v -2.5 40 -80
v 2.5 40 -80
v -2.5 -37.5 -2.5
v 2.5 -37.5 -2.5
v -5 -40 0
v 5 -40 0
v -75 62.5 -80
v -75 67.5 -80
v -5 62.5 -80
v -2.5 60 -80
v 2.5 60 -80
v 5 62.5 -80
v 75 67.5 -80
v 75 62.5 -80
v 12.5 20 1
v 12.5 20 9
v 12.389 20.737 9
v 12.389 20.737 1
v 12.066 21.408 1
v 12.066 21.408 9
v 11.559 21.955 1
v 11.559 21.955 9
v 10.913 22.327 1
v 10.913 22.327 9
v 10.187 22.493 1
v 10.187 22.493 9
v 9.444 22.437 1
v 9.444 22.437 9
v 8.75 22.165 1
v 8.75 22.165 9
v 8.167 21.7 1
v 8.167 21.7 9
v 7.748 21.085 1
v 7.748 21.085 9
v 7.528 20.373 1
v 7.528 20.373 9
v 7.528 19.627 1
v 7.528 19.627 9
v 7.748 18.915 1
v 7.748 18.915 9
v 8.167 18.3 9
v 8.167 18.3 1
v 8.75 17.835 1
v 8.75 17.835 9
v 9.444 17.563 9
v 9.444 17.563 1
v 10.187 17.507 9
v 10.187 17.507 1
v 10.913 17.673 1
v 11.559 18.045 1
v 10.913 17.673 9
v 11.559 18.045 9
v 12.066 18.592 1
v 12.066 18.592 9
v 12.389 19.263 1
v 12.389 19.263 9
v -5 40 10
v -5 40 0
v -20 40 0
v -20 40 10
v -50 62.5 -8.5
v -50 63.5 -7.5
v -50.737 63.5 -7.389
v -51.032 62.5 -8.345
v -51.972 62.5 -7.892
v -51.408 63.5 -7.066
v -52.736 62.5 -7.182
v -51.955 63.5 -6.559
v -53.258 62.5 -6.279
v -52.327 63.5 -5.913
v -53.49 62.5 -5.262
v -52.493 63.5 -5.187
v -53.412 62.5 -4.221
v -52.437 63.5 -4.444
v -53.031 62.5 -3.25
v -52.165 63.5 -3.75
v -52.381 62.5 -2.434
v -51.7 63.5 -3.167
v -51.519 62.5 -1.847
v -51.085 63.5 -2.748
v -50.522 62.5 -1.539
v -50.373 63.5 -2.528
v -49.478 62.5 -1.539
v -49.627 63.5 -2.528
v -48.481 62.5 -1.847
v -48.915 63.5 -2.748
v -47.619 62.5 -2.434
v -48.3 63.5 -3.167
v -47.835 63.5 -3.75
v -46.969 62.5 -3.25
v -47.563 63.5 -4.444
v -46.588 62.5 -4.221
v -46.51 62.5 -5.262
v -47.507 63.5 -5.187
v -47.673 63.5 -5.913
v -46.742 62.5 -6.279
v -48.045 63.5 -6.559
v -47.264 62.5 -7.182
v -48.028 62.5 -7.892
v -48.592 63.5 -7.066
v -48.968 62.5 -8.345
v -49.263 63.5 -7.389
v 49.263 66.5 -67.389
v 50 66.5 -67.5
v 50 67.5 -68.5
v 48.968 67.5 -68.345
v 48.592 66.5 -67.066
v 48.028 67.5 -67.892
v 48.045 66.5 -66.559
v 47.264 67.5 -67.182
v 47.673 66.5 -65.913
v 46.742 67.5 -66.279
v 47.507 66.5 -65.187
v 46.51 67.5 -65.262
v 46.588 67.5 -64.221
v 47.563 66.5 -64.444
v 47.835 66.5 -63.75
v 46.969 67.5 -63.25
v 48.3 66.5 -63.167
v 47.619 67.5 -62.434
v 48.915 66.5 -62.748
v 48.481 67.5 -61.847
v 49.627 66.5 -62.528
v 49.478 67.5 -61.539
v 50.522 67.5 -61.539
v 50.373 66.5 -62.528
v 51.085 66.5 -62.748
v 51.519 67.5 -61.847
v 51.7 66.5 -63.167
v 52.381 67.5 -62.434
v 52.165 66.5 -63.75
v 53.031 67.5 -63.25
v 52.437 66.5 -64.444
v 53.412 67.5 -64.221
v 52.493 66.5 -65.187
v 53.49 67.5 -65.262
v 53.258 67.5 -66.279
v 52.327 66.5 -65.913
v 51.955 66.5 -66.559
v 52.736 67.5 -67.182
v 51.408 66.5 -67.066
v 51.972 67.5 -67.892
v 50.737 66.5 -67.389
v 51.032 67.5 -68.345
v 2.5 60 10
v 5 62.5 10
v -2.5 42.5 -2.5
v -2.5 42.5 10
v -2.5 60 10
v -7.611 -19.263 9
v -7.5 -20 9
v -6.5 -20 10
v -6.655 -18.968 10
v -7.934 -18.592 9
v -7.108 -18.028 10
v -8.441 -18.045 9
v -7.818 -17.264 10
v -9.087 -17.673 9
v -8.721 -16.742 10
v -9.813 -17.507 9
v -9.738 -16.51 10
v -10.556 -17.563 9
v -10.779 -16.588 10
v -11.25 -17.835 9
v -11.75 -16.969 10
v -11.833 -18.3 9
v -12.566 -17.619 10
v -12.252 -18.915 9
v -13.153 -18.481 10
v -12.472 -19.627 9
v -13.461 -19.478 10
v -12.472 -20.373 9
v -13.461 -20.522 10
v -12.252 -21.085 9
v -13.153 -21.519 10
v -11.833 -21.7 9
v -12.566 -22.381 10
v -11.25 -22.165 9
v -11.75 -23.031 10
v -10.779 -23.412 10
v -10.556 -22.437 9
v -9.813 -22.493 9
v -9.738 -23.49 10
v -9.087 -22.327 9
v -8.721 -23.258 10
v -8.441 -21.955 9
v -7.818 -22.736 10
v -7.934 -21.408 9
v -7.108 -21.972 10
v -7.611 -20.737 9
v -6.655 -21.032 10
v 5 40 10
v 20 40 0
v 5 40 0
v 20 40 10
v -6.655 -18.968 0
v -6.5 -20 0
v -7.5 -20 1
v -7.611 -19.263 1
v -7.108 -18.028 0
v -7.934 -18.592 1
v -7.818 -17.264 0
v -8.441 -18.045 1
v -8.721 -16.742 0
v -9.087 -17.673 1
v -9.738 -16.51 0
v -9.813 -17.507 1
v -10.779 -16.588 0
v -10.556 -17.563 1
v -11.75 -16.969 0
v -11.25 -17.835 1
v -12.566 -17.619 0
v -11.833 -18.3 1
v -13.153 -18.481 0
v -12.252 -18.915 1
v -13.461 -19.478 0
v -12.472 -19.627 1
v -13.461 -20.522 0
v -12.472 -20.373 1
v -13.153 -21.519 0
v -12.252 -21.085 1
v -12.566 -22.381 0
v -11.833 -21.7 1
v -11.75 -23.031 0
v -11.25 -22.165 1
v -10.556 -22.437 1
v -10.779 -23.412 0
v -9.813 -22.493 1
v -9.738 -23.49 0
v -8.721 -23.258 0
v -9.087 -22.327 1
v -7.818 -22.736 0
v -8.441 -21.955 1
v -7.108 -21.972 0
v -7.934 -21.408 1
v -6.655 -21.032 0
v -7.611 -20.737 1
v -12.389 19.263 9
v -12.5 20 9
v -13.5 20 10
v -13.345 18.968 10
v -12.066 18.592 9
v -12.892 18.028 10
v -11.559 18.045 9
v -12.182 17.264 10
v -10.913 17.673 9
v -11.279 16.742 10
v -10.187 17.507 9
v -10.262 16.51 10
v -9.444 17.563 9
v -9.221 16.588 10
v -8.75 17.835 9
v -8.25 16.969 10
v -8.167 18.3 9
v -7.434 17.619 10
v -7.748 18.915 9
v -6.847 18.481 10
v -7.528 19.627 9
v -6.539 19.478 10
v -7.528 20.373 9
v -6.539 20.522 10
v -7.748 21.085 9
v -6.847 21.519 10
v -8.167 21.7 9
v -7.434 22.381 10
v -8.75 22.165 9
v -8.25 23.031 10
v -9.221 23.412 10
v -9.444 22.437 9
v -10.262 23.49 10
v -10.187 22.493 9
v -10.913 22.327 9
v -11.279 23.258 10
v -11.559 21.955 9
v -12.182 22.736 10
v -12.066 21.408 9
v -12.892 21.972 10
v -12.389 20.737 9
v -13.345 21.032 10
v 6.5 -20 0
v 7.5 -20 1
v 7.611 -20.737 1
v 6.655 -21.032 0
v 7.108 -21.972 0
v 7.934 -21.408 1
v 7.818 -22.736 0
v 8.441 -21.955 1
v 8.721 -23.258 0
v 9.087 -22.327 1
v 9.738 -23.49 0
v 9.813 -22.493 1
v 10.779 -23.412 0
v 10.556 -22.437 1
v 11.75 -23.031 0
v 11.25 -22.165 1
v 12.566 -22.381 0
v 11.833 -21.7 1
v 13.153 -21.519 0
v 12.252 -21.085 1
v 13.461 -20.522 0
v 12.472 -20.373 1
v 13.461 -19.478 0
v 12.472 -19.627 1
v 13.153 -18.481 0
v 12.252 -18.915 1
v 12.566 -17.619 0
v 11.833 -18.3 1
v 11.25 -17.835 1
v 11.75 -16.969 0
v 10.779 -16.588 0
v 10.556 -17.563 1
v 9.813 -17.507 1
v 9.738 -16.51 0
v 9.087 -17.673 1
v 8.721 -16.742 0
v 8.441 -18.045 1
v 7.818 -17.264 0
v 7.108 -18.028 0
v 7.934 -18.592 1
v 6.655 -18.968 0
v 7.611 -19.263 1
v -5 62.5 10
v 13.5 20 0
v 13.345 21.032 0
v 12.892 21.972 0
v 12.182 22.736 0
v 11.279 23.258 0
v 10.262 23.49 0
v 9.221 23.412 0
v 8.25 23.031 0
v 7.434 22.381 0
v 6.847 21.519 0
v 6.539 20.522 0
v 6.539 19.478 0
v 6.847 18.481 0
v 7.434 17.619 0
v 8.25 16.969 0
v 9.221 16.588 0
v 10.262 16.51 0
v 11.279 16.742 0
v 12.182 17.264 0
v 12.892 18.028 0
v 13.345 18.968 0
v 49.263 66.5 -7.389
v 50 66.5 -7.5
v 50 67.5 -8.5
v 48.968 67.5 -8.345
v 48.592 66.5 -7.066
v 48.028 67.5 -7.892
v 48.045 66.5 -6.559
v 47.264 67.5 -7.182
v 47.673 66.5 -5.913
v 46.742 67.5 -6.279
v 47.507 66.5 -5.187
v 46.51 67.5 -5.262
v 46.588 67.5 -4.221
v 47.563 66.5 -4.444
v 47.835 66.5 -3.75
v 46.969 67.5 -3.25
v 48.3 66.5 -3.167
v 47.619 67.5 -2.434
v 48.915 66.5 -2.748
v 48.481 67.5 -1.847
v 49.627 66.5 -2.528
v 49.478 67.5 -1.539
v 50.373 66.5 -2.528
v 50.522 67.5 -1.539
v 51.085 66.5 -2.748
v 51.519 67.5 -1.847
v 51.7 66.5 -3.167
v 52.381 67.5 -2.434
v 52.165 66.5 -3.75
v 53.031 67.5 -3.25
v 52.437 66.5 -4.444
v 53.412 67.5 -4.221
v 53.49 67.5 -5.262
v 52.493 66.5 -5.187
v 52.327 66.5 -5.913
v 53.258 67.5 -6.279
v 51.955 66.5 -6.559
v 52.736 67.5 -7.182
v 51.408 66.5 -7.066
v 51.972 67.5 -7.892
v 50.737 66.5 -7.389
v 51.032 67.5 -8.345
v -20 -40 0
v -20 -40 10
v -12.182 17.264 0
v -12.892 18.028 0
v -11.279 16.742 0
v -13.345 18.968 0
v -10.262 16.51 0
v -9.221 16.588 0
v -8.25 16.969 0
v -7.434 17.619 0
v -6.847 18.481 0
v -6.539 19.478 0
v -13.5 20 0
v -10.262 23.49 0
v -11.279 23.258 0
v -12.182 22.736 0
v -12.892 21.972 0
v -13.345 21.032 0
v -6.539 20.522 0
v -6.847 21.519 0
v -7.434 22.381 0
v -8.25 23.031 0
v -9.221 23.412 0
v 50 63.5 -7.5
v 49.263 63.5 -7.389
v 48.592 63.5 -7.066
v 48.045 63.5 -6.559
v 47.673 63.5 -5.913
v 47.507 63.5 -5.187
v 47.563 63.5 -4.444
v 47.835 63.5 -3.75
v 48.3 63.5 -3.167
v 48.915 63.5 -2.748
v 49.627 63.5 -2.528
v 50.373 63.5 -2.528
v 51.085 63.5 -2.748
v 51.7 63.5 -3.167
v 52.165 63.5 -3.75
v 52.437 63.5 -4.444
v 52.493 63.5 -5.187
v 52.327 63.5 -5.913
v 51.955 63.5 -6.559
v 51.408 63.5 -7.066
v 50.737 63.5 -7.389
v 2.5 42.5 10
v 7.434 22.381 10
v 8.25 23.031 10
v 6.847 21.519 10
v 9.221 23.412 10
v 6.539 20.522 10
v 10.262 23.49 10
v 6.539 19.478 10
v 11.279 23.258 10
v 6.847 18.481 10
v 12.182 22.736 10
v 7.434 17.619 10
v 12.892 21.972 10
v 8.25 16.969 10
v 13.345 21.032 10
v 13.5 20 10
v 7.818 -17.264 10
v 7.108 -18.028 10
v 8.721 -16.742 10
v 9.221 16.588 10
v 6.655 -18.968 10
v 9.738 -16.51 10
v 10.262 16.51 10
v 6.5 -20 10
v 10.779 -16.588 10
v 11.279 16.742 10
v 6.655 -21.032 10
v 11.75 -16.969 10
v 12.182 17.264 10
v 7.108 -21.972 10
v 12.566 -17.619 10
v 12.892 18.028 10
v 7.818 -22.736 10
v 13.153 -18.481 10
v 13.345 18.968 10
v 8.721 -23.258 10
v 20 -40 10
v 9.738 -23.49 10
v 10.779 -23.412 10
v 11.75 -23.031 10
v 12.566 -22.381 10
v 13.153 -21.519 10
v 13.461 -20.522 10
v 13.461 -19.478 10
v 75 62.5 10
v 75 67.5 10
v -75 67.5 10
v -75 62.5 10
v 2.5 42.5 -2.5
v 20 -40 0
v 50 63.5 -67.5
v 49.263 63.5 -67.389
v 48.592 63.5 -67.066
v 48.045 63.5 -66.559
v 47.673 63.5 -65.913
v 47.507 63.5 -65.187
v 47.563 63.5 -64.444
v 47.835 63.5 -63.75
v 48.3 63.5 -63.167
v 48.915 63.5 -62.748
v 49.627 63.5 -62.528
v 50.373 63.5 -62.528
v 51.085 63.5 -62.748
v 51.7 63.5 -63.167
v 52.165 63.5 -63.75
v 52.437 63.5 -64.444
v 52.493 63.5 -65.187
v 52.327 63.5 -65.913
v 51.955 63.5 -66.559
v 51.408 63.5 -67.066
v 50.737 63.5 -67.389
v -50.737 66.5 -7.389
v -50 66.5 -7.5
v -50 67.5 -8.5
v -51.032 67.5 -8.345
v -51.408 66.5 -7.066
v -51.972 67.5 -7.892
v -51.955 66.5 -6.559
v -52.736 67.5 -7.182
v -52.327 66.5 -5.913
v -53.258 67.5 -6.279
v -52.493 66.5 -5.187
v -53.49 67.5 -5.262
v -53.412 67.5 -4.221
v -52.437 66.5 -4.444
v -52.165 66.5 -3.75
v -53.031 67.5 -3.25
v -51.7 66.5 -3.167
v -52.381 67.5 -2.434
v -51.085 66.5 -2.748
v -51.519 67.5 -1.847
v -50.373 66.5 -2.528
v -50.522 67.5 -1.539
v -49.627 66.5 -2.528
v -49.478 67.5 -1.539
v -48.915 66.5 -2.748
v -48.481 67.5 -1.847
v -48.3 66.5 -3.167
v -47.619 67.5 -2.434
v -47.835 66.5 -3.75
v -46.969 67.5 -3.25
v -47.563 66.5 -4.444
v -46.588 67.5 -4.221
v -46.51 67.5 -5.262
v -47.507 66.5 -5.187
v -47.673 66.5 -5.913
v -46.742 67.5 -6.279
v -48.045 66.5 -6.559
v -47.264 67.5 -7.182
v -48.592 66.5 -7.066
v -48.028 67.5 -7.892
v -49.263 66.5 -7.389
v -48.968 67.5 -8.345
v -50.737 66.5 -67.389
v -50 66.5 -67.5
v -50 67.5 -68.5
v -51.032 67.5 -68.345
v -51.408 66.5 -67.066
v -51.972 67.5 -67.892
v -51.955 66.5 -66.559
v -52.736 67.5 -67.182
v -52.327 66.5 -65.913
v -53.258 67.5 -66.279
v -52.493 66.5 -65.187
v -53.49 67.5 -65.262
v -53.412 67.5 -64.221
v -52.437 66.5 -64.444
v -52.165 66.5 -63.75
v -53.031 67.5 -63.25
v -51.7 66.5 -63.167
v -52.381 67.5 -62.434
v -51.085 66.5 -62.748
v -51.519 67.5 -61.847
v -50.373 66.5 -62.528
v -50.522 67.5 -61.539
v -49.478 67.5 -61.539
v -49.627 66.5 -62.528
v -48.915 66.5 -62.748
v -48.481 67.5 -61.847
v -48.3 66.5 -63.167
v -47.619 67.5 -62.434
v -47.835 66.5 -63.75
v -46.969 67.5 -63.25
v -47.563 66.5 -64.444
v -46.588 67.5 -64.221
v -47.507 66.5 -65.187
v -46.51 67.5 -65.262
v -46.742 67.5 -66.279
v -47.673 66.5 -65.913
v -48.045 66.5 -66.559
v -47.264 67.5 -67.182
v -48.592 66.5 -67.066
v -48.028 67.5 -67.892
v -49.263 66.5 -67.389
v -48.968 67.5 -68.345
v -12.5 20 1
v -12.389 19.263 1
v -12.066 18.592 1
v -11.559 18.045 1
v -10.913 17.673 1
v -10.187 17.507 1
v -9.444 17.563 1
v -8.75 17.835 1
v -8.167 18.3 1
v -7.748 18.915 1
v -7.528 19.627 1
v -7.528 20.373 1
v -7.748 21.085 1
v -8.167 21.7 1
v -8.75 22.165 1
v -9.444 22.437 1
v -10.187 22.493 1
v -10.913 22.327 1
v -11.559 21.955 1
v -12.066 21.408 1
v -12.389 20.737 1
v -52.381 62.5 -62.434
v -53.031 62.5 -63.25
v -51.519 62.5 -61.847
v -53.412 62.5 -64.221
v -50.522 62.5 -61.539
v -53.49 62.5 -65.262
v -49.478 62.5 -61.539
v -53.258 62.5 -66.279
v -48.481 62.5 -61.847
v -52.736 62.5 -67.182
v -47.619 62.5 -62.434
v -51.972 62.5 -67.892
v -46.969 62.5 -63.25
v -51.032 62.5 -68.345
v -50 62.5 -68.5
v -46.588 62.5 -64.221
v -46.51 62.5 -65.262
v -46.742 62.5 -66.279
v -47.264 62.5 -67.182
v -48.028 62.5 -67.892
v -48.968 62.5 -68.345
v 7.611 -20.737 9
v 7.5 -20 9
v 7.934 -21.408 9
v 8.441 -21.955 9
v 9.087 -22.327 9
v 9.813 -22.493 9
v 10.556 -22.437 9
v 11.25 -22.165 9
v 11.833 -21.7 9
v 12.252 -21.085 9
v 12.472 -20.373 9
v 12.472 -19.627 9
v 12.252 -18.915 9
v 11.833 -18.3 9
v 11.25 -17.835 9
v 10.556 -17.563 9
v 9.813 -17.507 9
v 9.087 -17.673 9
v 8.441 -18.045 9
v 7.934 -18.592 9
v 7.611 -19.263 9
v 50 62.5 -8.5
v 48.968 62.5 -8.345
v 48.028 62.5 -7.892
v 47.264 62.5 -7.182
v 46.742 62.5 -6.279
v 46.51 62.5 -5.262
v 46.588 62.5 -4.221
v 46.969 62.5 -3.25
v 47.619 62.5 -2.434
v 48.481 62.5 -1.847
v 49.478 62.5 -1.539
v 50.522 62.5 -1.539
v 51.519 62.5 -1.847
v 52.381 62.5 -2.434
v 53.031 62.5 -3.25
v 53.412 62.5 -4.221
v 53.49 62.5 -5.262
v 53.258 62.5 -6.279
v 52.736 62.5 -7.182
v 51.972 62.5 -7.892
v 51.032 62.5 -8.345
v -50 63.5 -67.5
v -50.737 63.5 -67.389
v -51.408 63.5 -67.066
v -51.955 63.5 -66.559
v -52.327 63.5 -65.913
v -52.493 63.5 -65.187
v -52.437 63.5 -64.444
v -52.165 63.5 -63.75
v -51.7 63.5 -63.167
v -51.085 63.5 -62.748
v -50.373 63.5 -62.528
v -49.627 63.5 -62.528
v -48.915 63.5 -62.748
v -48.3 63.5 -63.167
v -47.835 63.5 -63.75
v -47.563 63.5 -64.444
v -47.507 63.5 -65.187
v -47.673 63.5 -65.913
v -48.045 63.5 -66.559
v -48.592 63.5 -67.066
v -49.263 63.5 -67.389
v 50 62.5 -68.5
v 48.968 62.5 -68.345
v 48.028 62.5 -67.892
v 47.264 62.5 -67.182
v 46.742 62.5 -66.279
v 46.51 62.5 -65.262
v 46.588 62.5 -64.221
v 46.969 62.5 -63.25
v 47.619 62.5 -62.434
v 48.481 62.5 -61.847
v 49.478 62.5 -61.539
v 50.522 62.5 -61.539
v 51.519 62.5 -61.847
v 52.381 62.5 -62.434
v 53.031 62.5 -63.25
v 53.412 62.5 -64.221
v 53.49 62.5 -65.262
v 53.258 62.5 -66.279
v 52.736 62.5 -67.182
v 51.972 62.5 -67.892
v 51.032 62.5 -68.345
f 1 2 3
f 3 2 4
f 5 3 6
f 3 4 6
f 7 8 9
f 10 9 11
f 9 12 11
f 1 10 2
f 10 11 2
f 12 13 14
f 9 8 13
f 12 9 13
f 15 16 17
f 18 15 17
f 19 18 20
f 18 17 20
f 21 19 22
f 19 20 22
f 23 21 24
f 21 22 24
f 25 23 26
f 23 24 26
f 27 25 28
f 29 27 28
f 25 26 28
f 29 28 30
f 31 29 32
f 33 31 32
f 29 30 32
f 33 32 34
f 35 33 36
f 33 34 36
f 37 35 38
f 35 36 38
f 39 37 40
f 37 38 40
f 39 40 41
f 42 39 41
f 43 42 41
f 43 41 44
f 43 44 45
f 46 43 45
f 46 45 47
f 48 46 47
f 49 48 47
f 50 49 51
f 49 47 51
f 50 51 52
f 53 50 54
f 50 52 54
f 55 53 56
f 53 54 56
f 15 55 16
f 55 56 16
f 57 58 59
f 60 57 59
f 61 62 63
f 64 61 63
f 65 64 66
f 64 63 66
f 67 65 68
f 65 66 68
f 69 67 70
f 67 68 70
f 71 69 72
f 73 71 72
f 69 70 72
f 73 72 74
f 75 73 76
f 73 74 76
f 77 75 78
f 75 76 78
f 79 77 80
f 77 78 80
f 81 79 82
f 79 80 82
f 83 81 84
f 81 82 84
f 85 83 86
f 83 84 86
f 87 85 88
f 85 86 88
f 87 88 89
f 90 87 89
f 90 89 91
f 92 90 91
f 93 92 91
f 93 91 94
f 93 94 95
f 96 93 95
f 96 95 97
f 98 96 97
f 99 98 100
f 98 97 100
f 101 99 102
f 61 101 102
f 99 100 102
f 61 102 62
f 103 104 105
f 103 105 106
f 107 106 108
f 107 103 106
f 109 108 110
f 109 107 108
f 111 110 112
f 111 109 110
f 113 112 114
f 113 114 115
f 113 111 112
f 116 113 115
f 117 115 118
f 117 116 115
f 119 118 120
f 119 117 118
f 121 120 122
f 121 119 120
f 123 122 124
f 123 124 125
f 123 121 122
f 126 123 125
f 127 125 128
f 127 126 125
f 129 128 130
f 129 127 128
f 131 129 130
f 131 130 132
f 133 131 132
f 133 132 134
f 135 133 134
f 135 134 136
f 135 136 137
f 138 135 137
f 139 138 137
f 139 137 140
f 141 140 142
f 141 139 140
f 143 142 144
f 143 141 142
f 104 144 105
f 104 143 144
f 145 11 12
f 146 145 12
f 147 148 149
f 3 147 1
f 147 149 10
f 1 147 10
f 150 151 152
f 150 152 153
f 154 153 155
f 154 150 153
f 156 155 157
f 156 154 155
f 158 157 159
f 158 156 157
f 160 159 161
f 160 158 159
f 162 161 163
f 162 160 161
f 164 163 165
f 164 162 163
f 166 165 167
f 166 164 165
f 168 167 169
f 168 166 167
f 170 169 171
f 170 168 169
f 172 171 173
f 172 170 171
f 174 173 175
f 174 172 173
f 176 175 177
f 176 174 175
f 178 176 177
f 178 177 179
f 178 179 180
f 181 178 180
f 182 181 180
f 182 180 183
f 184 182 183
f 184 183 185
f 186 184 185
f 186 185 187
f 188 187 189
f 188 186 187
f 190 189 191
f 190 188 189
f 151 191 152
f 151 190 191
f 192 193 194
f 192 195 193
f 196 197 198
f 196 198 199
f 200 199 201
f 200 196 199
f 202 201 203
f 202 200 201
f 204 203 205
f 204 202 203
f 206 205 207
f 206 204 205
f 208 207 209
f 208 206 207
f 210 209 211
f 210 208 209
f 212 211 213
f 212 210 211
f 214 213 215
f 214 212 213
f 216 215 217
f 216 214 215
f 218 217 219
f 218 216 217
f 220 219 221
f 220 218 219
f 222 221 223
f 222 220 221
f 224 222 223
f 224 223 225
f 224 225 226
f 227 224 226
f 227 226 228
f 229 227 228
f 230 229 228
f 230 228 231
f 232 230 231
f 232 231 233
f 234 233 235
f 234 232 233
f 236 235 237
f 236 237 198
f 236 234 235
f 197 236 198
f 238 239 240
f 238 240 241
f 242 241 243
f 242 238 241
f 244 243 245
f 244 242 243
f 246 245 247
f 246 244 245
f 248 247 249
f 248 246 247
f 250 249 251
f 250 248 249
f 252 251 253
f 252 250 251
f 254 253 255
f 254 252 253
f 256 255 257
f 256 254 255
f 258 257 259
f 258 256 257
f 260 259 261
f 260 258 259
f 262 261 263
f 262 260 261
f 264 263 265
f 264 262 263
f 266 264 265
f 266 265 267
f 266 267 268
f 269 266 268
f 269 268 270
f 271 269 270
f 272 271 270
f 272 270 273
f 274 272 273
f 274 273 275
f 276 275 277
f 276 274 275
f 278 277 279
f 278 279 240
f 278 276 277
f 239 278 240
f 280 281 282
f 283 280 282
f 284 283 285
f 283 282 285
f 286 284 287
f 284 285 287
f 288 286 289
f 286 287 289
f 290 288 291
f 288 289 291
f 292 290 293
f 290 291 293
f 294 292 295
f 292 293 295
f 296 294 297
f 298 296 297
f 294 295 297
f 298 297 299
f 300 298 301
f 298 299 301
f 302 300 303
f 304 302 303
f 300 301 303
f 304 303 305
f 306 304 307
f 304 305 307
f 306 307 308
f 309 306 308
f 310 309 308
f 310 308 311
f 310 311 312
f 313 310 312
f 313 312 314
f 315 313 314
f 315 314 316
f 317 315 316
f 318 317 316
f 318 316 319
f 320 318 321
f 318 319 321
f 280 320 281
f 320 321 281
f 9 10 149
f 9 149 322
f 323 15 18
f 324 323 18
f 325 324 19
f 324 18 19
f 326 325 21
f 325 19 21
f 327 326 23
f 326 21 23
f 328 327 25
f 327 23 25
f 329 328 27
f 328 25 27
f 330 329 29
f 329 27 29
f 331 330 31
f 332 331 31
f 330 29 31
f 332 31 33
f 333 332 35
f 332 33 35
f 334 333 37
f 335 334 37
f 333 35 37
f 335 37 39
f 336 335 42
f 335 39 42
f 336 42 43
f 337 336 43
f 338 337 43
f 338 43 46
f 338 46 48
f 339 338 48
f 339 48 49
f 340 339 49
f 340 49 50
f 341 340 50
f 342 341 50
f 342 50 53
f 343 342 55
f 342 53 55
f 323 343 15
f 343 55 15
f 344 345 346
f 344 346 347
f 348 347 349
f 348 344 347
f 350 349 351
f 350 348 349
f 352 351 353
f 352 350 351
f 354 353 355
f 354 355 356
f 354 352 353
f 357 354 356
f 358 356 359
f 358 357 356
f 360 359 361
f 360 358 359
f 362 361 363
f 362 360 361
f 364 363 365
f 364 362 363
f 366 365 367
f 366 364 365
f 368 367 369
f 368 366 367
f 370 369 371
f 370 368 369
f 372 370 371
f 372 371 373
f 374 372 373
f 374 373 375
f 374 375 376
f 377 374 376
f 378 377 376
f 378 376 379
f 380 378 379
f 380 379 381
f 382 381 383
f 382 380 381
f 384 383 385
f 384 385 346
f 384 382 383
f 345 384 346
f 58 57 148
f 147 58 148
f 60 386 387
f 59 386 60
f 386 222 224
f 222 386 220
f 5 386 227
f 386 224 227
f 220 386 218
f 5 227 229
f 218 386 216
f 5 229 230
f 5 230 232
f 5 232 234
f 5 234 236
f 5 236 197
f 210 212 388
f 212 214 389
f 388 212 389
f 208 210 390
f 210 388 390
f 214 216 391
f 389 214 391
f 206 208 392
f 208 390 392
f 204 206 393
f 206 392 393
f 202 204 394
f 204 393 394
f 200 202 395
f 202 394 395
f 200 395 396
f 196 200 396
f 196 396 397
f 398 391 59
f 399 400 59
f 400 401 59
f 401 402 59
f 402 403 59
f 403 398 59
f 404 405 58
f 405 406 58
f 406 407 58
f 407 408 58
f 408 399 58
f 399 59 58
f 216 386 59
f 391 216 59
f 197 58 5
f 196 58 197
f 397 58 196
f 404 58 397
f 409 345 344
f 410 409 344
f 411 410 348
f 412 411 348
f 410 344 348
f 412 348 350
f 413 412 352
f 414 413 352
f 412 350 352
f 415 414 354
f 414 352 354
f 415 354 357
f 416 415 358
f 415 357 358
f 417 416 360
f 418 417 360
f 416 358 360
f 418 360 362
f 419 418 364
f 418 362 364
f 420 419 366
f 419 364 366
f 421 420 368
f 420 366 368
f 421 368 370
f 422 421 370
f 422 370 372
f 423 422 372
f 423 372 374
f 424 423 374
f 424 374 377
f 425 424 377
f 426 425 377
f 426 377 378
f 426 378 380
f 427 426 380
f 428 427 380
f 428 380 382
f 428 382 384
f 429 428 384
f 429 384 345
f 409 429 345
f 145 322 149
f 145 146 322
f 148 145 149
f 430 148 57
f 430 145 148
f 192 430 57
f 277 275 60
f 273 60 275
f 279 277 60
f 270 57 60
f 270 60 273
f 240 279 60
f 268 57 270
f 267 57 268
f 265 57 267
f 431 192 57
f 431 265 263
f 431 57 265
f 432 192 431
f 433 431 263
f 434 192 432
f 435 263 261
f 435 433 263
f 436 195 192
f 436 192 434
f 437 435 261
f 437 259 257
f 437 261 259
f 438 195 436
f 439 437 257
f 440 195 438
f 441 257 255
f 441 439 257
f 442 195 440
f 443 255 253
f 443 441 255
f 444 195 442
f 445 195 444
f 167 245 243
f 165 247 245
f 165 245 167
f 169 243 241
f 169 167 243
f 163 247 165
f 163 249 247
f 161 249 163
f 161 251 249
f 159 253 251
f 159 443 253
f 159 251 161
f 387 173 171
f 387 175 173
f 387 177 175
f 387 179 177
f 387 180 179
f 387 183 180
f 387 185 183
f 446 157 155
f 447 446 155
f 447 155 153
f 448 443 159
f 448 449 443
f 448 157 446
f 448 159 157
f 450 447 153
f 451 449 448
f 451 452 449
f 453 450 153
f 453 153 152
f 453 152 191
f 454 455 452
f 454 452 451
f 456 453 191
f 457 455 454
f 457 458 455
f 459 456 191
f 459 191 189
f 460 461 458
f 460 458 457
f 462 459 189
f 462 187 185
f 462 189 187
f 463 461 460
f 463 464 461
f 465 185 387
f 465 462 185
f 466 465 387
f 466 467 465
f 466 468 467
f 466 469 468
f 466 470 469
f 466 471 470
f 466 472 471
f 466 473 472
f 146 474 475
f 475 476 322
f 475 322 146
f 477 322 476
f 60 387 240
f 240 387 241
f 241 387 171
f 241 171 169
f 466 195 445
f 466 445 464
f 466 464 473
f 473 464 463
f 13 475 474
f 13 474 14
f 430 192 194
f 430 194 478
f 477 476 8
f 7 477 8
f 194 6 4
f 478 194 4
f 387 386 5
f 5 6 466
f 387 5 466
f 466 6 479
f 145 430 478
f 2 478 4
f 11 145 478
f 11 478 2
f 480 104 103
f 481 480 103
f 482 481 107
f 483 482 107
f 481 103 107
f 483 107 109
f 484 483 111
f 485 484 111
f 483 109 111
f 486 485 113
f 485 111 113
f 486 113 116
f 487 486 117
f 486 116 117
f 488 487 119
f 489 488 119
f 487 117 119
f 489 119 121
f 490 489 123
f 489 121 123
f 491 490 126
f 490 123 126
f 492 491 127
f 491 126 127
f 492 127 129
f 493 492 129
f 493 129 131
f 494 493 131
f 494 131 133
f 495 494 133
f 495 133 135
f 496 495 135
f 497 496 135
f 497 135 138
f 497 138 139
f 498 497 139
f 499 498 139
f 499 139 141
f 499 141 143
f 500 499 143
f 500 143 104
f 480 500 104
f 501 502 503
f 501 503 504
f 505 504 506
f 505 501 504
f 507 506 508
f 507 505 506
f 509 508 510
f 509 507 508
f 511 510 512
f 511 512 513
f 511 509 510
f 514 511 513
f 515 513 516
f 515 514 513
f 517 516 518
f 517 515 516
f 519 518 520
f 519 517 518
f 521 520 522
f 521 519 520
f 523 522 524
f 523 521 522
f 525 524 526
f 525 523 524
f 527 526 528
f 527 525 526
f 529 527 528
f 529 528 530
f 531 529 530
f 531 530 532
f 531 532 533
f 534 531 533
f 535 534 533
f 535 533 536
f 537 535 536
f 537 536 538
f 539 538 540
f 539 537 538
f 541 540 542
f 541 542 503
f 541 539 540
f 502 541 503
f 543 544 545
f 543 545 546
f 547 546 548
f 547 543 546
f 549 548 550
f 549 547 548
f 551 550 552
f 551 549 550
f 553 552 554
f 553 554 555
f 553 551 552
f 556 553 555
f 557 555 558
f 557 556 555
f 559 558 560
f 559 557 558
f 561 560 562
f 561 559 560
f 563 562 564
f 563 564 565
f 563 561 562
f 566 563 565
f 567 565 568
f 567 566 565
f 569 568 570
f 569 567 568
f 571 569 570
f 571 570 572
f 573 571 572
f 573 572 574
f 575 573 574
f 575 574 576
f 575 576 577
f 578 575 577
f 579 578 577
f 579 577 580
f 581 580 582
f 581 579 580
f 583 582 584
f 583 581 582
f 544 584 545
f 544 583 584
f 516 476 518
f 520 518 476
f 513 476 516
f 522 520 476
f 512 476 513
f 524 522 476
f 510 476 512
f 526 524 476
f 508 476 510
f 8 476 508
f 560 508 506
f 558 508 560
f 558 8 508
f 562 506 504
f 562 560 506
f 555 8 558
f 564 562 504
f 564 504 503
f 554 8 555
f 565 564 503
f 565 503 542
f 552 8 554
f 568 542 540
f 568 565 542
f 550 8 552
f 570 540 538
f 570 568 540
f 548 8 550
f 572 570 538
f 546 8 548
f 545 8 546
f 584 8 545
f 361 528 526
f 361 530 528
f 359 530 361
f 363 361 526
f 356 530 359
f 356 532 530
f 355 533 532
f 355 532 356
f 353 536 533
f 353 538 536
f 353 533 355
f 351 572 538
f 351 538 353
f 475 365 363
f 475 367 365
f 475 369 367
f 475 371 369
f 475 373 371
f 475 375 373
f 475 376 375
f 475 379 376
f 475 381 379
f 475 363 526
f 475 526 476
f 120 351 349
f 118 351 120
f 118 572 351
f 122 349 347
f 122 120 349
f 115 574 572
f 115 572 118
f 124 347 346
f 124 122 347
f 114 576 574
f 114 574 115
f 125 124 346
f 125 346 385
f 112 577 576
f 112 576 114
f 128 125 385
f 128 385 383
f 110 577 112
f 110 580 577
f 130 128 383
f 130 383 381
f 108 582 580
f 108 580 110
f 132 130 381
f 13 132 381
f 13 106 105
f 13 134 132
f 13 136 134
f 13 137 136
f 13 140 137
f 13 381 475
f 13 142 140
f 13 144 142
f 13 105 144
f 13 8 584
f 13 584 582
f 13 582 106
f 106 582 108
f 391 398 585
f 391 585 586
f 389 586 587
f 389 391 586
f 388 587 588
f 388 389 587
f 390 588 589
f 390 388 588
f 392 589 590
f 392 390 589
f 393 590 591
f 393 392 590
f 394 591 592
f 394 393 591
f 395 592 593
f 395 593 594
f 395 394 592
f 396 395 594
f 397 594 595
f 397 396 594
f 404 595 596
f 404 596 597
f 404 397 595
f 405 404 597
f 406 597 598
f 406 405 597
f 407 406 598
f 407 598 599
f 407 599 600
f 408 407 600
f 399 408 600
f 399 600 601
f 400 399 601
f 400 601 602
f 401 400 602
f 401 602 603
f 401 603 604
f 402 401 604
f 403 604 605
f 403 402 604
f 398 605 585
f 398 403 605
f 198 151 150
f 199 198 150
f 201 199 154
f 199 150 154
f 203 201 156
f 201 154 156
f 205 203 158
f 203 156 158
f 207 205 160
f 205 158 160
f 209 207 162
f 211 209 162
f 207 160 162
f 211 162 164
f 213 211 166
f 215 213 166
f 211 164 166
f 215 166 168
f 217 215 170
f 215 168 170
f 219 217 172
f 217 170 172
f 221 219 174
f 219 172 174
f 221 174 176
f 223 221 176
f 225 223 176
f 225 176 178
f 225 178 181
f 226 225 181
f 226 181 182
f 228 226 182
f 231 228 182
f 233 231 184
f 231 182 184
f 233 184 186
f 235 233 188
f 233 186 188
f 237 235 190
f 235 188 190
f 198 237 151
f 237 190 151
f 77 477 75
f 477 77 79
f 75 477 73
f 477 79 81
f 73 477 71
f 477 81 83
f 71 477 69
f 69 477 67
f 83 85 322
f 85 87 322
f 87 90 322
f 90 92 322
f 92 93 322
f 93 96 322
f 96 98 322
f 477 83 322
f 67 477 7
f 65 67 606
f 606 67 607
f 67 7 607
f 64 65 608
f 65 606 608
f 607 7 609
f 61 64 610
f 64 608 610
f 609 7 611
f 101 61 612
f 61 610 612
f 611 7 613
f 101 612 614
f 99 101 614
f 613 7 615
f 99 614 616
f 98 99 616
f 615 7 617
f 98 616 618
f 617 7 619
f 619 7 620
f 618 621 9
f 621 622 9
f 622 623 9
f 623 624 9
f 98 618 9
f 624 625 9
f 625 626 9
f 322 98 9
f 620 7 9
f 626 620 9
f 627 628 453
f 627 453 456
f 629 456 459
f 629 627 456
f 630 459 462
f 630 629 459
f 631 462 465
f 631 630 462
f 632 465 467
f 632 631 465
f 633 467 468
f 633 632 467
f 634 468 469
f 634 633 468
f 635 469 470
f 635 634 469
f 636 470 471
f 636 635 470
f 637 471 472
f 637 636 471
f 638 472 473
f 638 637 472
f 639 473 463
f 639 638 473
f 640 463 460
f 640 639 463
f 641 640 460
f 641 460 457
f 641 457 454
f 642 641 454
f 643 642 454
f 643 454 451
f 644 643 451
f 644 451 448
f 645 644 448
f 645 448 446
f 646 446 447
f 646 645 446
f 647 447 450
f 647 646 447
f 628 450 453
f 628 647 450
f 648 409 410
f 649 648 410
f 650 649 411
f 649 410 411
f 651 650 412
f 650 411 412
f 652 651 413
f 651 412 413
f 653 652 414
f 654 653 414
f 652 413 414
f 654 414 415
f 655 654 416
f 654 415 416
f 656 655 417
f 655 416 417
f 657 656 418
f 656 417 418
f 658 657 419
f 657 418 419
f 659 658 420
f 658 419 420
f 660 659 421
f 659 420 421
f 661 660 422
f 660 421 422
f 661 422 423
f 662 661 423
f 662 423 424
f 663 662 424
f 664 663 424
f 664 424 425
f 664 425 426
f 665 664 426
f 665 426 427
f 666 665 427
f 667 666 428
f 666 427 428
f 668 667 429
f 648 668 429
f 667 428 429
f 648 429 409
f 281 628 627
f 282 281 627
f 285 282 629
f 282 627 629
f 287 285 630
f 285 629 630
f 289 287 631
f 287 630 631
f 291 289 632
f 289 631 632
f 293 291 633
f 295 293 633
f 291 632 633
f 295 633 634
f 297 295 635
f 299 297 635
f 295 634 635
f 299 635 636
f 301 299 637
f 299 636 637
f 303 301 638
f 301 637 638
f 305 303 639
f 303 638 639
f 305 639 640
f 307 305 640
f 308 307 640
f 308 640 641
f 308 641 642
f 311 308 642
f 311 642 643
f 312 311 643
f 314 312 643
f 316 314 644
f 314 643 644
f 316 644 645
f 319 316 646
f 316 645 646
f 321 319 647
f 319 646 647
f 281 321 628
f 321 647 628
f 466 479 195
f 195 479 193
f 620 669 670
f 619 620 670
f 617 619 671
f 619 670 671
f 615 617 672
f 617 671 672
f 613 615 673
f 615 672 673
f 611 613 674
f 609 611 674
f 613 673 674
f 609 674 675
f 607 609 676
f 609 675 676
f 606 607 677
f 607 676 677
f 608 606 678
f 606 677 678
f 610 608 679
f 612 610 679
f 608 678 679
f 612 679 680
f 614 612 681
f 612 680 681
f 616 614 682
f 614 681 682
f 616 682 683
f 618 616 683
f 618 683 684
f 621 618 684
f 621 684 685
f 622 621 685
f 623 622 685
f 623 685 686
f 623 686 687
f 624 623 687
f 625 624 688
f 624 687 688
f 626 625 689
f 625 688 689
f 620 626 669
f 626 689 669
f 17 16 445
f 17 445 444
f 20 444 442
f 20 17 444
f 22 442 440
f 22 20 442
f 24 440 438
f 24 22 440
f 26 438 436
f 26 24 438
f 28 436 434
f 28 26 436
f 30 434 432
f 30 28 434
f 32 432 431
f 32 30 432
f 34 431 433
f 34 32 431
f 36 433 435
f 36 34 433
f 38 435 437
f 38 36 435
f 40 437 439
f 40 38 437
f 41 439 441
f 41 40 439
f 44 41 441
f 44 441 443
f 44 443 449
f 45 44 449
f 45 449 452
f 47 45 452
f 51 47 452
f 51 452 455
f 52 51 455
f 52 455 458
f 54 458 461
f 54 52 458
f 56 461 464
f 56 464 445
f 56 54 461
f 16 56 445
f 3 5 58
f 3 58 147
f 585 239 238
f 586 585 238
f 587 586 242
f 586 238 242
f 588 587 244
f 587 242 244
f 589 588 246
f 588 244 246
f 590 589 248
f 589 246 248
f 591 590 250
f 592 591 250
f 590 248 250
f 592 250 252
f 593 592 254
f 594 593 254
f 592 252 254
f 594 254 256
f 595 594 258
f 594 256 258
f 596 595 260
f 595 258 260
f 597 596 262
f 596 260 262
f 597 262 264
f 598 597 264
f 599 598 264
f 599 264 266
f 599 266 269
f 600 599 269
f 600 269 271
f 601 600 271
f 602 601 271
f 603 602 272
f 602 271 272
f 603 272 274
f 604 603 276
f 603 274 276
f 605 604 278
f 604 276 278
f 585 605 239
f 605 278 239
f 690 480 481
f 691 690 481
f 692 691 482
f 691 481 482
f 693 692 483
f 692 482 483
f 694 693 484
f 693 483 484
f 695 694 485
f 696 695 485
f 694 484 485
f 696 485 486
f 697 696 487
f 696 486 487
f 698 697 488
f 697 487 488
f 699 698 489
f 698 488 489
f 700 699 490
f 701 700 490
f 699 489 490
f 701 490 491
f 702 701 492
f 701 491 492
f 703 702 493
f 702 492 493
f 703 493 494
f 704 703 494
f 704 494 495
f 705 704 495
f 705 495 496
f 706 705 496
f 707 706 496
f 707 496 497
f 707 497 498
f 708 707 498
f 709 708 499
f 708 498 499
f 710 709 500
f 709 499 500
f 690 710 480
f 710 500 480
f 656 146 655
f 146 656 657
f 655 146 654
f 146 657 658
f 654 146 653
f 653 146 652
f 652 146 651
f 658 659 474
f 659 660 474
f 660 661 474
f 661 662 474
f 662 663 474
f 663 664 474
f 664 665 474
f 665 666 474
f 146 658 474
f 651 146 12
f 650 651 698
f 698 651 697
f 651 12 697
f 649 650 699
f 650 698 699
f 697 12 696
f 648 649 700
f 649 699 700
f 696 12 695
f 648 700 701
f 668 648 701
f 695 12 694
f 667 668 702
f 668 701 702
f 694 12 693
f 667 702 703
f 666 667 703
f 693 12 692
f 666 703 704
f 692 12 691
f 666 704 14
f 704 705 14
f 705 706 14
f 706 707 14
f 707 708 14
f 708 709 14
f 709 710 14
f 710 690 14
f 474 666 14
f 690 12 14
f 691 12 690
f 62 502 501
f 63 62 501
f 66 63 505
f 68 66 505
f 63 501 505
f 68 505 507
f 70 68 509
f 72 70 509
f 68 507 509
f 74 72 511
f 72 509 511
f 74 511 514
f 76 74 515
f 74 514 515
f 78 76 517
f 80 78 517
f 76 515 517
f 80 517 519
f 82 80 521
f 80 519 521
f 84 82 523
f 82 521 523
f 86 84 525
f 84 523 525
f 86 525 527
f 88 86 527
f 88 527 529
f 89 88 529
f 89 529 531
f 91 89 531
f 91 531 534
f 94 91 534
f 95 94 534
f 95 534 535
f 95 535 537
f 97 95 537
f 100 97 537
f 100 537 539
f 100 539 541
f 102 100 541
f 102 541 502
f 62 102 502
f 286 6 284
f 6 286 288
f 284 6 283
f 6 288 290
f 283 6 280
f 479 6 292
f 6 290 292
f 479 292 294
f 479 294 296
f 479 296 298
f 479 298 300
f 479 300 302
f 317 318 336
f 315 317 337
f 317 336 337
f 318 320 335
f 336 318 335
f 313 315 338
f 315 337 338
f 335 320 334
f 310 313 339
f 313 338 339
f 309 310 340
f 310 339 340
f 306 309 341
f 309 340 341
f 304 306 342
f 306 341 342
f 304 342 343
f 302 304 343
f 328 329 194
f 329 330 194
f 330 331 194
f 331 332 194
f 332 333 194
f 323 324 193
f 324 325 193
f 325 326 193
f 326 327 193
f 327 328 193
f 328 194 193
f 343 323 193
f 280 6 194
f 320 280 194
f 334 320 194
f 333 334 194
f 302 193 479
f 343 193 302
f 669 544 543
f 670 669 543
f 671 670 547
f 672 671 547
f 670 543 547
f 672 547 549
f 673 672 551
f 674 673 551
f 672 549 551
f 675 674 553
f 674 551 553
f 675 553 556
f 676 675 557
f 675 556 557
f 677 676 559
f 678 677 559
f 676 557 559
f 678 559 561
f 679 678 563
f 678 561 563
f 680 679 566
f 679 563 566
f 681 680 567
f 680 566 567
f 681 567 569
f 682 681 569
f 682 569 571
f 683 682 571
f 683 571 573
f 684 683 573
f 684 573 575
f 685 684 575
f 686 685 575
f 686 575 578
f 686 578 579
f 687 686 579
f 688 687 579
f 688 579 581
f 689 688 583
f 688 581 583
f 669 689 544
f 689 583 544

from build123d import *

# Parameters (mm, degrees)
SKETCH1_W           = 40
SKETCH1_H           = 80
BOSS_EXTRUDE1_DEPTH = 10
SKETCH2_R           = 2.5
CUT_EXTRUDE1_DEPTH  = 10
BOSS_EXTRUDE2_DEPTH = 2.5
SKETCH4_W           = 150
SKETCH4_H           = 90
BOSS_EXTRUDE3_DEPTH = 2.5
CHAMFER1_SIZE       = 2.5
SKETCH5_R           = 2.5
CUT_EXTRUDE2_DEPTH  = 35
CHAMFER2_SIZE       = 1


with BuildPart() as part:
    # Sketch1 → Boss-Extrude1 (new body)
    with BuildSketch(Plane.XY):
        Rectangle(SKETCH1_W, SKETCH1_H)
    extrude(amount=BOSS_EXTRUDE1_DEPTH)

    # Sketch2 → Cut-Extrude1 (cut)
    with BuildSketch(Plane.XY.offset(10)):
        with Locations((-10, -20)):
            Circle(SKETCH2_R)
        with Locations(Location((10, -20, 0), (0, 0, 180))):
            Circle(SKETCH2_R)
        with Locations((10, 20)):
            Circle(SKETCH2_R)
        with Locations(Location((-10, 20, 0), (0, 0, 180))):
            Circle(SKETCH2_R)
    extrude(amount=-CUT_EXTRUDE1_DEPTH, mode=Mode.SUBTRACT)

    # Sketch3 → Boss-Extrude2 (add, symmetric)
    with BuildSketch(Plane(origin=(0, 0, 0), x_dir=(0, 0, -1), z_dir=(1, 0, 0))):
        Polygon((0, -40), (80, 40), (80, 65), (-10, 65), (-10, 40), (0, 40), align=None)
    extrude(amount=BOSS_EXTRUDE2_DEPTH, both=True)

    # Sketch4 → Boss-Extrude3 (add, symmetric)
    with BuildSketch(Plane(origin=(0, 65, 0), x_dir=(1, 0, 0), z_dir=(0, 1, 0))):
        with Locations((0, 35)):
            Rectangle(SKETCH4_W, SKETCH4_H)
    extrude(amount=BOSS_EXTRUDE3_DEPTH, both=True)

    # Chamfer1
    # the kernel refuses this chamfer: 2.5 mm, written as the material it adds along each edge
    with BuildSketch(Plane(origin=(-2.5, 40, 0), x_dir=(-0.9996219169112968, 0, 0.027495876610586372), z_dir=(0, -1, 0))) as chamfer1_piece_1_section:
        Polygon((CHAMFER1_SIZE * 0.999621916911, CHAMFER1_SIZE * 0.0274958766106), (-CHAMFER1_SIZE * 0.0274958766106, CHAMFER1_SIZE * 0.999621916911), (0, 0), align=None)
    chamfer1_piece_1 = extrude(amount=80, mode=Mode.PRIVATE)
    chamfer1_piece_1 = split(chamfer1_piece_1, bisect_by=Plane(origin=(-3.327144793, -19.384975846, -20.615024154), z_dir=(0, 0.7071067811865487, 0.7071067811865464)), keep=Keep.TOP, mode=Mode.PRIVATE)
    add(chamfer1_piece_1)
    with BuildSketch(Plane(origin=(-2.5, 40, 10), x_dir=(-0.9996219169112968, -0.0274958766105877, 0), z_dir=(0, 0, -1))) as chamfer1_piece_2:
        Polygon((CHAMFER1_SIZE * 0.999621916911, CHAMFER1_SIZE * 0.0274958766106), (-CHAMFER1_SIZE * 0.0274958766106, CHAMFER1_SIZE * 0.999621916911), (0, 0), align=None)
    extrude(amount=10)
    with BuildSketch(Plane(origin=(2.5, 40, 0), x_dir=(0.9996219169112968, 0, 0.027495876610586372), z_dir=(0, -1, 0))) as chamfer1_piece_3_section:
        Polygon((CHAMFER1_SIZE * 0.999621916911, -CHAMFER1_SIZE * 0.0274958766106), (-CHAMFER1_SIZE * 0.0274958766106, -CHAMFER1_SIZE * 0.999621916911), (0, 0), align=None)
    chamfer1_piece_3 = extrude(amount=80, mode=Mode.PRIVATE)
    chamfer1_piece_3 = split(chamfer1_piece_3, bisect_by=Plane(origin=(3.327144793, -19.384975846, -20.615024154), z_dir=(0, 0.7071067811865487, 0.7071067811865464)), keep=Keep.TOP, mode=Mode.PRIVATE)
    add(chamfer1_piece_3)
    with BuildSketch(Plane(origin=(2.5, 40, 10), x_dir=(0.9996219169112968, -0.0274958766105877, 0), z_dir=(0, 0, -1))) as chamfer1_piece_4:
        Polygon((CHAMFER1_SIZE * 0.999621916911, -CHAMFER1_SIZE * 0.0274958766106), (-CHAMFER1_SIZE * 0.0274958766106, -CHAMFER1_SIZE * 0.999621916911), (0, 0), align=None)
    extrude(amount=10)
    with BuildSketch(Plane(origin=(-2.5, 62.5, -80), x_dir=(0.027495876610586282, -0.9996219169112968, 0), z_dir=(0, 0, 1))) as chamfer1_piece_5:
        Polygon((CHAMFER1_SIZE * 0.999621916911, -CHAMFER1_SIZE * 0.0274958766106), (-CHAMFER1_SIZE * 0.0274958766106, -CHAMFER1_SIZE * 0.999621916911), (0, 0), align=None)
    extrude(amount=90)
    with BuildSketch(Plane(origin=(2.5, 62.5, -80), x_dir=(-0.027495876610586282, -0.9996219169112968, 0), z_dir=(0, 0, 1))) as chamfer1_piece_6:
        Polygon((CHAMFER1_SIZE * 0.999621916911, CHAMFER1_SIZE * 0.0274958766106), (-CHAMFER1_SIZE * 0.0274958766106, CHAMFER1_SIZE * 0.999621916911), (0, 0), align=None)
    extrude(amount=90)
    with BuildSketch(Plane(origin=(-2.5, 46.42920747, 0), x_dir=(-0.9996219169112968, 0, 0.027495876610586372), z_dir=(0, -1, 0))) as chamfer1_piece_7a_section:
        Polygon((CHAMFER1_SIZE * 0.999621916911, CHAMFER1_SIZE * 0.0274958766106), (-CHAMFER1_SIZE * 0.0274958766106, CHAMFER1_SIZE * 0.999621916911), (0, 0), align=None)
    chamfer1_piece_7a = extrude(amount=86.42920747, mode=Mode.PRIVATE)
    chamfer1_piece_7a = split(chamfer1_piece_7a, bisect_by=Plane(origin=(-3.324484067, 40, -0.824484067), z_dir=(0, 1, 0)), keep=Keep.TOP, mode=Mode.PRIVATE)
    with BuildSketch(Plane(origin=(-2.5, 40, 10), x_dir=(-0.9996219169112968, -0.0274958766105877, 0), z_dir=(0, 0, -1))) as chamfer1_piece_7b_section:
        Polygon((CHAMFER1_SIZE * 0.999621916911, CHAMFER1_SIZE * 0.0274958766106), (-CHAMFER1_SIZE * 0.0274958766106, CHAMFER1_SIZE * 0.999621916911), (0, 0), align=None)
    chamfer1_piece_7b = extrude(amount=16.42920747, mode=Mode.PRIVATE)
    chamfer1_piece_7b = split(chamfer1_piece_7b, bisect_by=Plane(origin=(-3.324484067, 40.824484067, 0), z_dir=(0, 0, -1)), keep=Keep.TOP, mode=Mode.PRIVATE)
    chamfer1_piece_7 = chamfer1_piece_7a & chamfer1_piece_7b
    add(chamfer1_piece_7)
    with BuildSketch(Plane(origin=(2.5, 46.42920747, 0), x_dir=(0.9996219169112968, 0, 0.027495876610586372), z_dir=(0, -1, 0))) as chamfer1_piece_8a_section:
        Polygon((CHAMFER1_SIZE * 0.999621916911, -CHAMFER1_SIZE * 0.0274958766106), (-CHAMFER1_SIZE * 0.0274958766106, -CHAMFER1_SIZE * 0.999621916911), (0, 0), align=None)
    chamfer1_piece_8a = extrude(amount=86.42920747, mode=Mode.PRIVATE)
    chamfer1_piece_8a = split(chamfer1_piece_8a, bisect_by=Plane(origin=(3.324484067, 40, -0.824484067), z_dir=(0, 1, 0)), keep=Keep.TOP, mode=Mode.PRIVATE)
    with BuildSketch(Plane(origin=(2.5, 40, 10), x_dir=(0.9996219169112968, -0.0274958766105877, 0), z_dir=(0, 0, -1))) as chamfer1_piece_8b_section:
        Polygon((CHAMFER1_SIZE * 0.999621916911, -CHAMFER1_SIZE * 0.0274958766106), (-CHAMFER1_SIZE * 0.0274958766106, -CHAMFER1_SIZE * 0.999621916911), (0, 0), align=None)
    chamfer1_piece_8b = extrude(amount=16.42920747, mode=Mode.PRIVATE)
    chamfer1_piece_8b = split(chamfer1_piece_8b, bisect_by=Plane(origin=(3.324484067, 40.824484067, 0), z_dir=(0, 0, -1)), keep=Keep.TOP, mode=Mode.PRIVATE)
    chamfer1_piece_8 = chamfer1_piece_8a & chamfer1_piece_8b
    add(chamfer1_piece_8)

    # Sketch5 → Cut-Extrude2 (cut, symmetric)
    with BuildSketch(Plane(origin=(0, 67.5, 0), x_dir=(1, 0, 0), z_dir=(0, 1, 0))):
        with Locations(Location((50, 65, 0), (0, 0, 90))):
            Circle(SKETCH5_R)
        with Locations(Location((50, 5, 0), (0, 0, 90))):
            Circle(SKETCH5_R)
        with Locations(Location((-50, 5, 0), (0, 0, 90))):
            Circle(SKETCH5_R)
        with Locations(Location((-50, 65, 0), (0, 0, 90))):
            Circle(SKETCH5_R)
    extrude(amount=CUT_EXTRUDE2_DEPTH, both=True, mode=Mode.SUBTRACT)

    # Chamfer2
    chamfer2_edges = [part.edges().sort_by_distance(p)[0] for p in [
        (-50, 62.5, -62.5),
        (-50, 67.5, -62.5),
        (-50, 62.5, -2.5),
        (-50, 67.5, -2.5),
        (50, 67.5, -2.5),
        (50, 62.5, -2.5),
        (50, 67.5, -62.5),
        (50, 62.5, -62.5),
        (-7.5, 20, 0),
        (-7.5, 20, 10),
        (7.5, 20, 0),
        (7.5, 20, 10),
        (12.5, -20, 0),
        (12.5, -20, 10),
        (-12.5, -20, 0),
        (-12.5, -20, 10),
    ]]
    chamfer(chamfer2_edges, length=CHAMFER2_SIZE)


solid = part.part
